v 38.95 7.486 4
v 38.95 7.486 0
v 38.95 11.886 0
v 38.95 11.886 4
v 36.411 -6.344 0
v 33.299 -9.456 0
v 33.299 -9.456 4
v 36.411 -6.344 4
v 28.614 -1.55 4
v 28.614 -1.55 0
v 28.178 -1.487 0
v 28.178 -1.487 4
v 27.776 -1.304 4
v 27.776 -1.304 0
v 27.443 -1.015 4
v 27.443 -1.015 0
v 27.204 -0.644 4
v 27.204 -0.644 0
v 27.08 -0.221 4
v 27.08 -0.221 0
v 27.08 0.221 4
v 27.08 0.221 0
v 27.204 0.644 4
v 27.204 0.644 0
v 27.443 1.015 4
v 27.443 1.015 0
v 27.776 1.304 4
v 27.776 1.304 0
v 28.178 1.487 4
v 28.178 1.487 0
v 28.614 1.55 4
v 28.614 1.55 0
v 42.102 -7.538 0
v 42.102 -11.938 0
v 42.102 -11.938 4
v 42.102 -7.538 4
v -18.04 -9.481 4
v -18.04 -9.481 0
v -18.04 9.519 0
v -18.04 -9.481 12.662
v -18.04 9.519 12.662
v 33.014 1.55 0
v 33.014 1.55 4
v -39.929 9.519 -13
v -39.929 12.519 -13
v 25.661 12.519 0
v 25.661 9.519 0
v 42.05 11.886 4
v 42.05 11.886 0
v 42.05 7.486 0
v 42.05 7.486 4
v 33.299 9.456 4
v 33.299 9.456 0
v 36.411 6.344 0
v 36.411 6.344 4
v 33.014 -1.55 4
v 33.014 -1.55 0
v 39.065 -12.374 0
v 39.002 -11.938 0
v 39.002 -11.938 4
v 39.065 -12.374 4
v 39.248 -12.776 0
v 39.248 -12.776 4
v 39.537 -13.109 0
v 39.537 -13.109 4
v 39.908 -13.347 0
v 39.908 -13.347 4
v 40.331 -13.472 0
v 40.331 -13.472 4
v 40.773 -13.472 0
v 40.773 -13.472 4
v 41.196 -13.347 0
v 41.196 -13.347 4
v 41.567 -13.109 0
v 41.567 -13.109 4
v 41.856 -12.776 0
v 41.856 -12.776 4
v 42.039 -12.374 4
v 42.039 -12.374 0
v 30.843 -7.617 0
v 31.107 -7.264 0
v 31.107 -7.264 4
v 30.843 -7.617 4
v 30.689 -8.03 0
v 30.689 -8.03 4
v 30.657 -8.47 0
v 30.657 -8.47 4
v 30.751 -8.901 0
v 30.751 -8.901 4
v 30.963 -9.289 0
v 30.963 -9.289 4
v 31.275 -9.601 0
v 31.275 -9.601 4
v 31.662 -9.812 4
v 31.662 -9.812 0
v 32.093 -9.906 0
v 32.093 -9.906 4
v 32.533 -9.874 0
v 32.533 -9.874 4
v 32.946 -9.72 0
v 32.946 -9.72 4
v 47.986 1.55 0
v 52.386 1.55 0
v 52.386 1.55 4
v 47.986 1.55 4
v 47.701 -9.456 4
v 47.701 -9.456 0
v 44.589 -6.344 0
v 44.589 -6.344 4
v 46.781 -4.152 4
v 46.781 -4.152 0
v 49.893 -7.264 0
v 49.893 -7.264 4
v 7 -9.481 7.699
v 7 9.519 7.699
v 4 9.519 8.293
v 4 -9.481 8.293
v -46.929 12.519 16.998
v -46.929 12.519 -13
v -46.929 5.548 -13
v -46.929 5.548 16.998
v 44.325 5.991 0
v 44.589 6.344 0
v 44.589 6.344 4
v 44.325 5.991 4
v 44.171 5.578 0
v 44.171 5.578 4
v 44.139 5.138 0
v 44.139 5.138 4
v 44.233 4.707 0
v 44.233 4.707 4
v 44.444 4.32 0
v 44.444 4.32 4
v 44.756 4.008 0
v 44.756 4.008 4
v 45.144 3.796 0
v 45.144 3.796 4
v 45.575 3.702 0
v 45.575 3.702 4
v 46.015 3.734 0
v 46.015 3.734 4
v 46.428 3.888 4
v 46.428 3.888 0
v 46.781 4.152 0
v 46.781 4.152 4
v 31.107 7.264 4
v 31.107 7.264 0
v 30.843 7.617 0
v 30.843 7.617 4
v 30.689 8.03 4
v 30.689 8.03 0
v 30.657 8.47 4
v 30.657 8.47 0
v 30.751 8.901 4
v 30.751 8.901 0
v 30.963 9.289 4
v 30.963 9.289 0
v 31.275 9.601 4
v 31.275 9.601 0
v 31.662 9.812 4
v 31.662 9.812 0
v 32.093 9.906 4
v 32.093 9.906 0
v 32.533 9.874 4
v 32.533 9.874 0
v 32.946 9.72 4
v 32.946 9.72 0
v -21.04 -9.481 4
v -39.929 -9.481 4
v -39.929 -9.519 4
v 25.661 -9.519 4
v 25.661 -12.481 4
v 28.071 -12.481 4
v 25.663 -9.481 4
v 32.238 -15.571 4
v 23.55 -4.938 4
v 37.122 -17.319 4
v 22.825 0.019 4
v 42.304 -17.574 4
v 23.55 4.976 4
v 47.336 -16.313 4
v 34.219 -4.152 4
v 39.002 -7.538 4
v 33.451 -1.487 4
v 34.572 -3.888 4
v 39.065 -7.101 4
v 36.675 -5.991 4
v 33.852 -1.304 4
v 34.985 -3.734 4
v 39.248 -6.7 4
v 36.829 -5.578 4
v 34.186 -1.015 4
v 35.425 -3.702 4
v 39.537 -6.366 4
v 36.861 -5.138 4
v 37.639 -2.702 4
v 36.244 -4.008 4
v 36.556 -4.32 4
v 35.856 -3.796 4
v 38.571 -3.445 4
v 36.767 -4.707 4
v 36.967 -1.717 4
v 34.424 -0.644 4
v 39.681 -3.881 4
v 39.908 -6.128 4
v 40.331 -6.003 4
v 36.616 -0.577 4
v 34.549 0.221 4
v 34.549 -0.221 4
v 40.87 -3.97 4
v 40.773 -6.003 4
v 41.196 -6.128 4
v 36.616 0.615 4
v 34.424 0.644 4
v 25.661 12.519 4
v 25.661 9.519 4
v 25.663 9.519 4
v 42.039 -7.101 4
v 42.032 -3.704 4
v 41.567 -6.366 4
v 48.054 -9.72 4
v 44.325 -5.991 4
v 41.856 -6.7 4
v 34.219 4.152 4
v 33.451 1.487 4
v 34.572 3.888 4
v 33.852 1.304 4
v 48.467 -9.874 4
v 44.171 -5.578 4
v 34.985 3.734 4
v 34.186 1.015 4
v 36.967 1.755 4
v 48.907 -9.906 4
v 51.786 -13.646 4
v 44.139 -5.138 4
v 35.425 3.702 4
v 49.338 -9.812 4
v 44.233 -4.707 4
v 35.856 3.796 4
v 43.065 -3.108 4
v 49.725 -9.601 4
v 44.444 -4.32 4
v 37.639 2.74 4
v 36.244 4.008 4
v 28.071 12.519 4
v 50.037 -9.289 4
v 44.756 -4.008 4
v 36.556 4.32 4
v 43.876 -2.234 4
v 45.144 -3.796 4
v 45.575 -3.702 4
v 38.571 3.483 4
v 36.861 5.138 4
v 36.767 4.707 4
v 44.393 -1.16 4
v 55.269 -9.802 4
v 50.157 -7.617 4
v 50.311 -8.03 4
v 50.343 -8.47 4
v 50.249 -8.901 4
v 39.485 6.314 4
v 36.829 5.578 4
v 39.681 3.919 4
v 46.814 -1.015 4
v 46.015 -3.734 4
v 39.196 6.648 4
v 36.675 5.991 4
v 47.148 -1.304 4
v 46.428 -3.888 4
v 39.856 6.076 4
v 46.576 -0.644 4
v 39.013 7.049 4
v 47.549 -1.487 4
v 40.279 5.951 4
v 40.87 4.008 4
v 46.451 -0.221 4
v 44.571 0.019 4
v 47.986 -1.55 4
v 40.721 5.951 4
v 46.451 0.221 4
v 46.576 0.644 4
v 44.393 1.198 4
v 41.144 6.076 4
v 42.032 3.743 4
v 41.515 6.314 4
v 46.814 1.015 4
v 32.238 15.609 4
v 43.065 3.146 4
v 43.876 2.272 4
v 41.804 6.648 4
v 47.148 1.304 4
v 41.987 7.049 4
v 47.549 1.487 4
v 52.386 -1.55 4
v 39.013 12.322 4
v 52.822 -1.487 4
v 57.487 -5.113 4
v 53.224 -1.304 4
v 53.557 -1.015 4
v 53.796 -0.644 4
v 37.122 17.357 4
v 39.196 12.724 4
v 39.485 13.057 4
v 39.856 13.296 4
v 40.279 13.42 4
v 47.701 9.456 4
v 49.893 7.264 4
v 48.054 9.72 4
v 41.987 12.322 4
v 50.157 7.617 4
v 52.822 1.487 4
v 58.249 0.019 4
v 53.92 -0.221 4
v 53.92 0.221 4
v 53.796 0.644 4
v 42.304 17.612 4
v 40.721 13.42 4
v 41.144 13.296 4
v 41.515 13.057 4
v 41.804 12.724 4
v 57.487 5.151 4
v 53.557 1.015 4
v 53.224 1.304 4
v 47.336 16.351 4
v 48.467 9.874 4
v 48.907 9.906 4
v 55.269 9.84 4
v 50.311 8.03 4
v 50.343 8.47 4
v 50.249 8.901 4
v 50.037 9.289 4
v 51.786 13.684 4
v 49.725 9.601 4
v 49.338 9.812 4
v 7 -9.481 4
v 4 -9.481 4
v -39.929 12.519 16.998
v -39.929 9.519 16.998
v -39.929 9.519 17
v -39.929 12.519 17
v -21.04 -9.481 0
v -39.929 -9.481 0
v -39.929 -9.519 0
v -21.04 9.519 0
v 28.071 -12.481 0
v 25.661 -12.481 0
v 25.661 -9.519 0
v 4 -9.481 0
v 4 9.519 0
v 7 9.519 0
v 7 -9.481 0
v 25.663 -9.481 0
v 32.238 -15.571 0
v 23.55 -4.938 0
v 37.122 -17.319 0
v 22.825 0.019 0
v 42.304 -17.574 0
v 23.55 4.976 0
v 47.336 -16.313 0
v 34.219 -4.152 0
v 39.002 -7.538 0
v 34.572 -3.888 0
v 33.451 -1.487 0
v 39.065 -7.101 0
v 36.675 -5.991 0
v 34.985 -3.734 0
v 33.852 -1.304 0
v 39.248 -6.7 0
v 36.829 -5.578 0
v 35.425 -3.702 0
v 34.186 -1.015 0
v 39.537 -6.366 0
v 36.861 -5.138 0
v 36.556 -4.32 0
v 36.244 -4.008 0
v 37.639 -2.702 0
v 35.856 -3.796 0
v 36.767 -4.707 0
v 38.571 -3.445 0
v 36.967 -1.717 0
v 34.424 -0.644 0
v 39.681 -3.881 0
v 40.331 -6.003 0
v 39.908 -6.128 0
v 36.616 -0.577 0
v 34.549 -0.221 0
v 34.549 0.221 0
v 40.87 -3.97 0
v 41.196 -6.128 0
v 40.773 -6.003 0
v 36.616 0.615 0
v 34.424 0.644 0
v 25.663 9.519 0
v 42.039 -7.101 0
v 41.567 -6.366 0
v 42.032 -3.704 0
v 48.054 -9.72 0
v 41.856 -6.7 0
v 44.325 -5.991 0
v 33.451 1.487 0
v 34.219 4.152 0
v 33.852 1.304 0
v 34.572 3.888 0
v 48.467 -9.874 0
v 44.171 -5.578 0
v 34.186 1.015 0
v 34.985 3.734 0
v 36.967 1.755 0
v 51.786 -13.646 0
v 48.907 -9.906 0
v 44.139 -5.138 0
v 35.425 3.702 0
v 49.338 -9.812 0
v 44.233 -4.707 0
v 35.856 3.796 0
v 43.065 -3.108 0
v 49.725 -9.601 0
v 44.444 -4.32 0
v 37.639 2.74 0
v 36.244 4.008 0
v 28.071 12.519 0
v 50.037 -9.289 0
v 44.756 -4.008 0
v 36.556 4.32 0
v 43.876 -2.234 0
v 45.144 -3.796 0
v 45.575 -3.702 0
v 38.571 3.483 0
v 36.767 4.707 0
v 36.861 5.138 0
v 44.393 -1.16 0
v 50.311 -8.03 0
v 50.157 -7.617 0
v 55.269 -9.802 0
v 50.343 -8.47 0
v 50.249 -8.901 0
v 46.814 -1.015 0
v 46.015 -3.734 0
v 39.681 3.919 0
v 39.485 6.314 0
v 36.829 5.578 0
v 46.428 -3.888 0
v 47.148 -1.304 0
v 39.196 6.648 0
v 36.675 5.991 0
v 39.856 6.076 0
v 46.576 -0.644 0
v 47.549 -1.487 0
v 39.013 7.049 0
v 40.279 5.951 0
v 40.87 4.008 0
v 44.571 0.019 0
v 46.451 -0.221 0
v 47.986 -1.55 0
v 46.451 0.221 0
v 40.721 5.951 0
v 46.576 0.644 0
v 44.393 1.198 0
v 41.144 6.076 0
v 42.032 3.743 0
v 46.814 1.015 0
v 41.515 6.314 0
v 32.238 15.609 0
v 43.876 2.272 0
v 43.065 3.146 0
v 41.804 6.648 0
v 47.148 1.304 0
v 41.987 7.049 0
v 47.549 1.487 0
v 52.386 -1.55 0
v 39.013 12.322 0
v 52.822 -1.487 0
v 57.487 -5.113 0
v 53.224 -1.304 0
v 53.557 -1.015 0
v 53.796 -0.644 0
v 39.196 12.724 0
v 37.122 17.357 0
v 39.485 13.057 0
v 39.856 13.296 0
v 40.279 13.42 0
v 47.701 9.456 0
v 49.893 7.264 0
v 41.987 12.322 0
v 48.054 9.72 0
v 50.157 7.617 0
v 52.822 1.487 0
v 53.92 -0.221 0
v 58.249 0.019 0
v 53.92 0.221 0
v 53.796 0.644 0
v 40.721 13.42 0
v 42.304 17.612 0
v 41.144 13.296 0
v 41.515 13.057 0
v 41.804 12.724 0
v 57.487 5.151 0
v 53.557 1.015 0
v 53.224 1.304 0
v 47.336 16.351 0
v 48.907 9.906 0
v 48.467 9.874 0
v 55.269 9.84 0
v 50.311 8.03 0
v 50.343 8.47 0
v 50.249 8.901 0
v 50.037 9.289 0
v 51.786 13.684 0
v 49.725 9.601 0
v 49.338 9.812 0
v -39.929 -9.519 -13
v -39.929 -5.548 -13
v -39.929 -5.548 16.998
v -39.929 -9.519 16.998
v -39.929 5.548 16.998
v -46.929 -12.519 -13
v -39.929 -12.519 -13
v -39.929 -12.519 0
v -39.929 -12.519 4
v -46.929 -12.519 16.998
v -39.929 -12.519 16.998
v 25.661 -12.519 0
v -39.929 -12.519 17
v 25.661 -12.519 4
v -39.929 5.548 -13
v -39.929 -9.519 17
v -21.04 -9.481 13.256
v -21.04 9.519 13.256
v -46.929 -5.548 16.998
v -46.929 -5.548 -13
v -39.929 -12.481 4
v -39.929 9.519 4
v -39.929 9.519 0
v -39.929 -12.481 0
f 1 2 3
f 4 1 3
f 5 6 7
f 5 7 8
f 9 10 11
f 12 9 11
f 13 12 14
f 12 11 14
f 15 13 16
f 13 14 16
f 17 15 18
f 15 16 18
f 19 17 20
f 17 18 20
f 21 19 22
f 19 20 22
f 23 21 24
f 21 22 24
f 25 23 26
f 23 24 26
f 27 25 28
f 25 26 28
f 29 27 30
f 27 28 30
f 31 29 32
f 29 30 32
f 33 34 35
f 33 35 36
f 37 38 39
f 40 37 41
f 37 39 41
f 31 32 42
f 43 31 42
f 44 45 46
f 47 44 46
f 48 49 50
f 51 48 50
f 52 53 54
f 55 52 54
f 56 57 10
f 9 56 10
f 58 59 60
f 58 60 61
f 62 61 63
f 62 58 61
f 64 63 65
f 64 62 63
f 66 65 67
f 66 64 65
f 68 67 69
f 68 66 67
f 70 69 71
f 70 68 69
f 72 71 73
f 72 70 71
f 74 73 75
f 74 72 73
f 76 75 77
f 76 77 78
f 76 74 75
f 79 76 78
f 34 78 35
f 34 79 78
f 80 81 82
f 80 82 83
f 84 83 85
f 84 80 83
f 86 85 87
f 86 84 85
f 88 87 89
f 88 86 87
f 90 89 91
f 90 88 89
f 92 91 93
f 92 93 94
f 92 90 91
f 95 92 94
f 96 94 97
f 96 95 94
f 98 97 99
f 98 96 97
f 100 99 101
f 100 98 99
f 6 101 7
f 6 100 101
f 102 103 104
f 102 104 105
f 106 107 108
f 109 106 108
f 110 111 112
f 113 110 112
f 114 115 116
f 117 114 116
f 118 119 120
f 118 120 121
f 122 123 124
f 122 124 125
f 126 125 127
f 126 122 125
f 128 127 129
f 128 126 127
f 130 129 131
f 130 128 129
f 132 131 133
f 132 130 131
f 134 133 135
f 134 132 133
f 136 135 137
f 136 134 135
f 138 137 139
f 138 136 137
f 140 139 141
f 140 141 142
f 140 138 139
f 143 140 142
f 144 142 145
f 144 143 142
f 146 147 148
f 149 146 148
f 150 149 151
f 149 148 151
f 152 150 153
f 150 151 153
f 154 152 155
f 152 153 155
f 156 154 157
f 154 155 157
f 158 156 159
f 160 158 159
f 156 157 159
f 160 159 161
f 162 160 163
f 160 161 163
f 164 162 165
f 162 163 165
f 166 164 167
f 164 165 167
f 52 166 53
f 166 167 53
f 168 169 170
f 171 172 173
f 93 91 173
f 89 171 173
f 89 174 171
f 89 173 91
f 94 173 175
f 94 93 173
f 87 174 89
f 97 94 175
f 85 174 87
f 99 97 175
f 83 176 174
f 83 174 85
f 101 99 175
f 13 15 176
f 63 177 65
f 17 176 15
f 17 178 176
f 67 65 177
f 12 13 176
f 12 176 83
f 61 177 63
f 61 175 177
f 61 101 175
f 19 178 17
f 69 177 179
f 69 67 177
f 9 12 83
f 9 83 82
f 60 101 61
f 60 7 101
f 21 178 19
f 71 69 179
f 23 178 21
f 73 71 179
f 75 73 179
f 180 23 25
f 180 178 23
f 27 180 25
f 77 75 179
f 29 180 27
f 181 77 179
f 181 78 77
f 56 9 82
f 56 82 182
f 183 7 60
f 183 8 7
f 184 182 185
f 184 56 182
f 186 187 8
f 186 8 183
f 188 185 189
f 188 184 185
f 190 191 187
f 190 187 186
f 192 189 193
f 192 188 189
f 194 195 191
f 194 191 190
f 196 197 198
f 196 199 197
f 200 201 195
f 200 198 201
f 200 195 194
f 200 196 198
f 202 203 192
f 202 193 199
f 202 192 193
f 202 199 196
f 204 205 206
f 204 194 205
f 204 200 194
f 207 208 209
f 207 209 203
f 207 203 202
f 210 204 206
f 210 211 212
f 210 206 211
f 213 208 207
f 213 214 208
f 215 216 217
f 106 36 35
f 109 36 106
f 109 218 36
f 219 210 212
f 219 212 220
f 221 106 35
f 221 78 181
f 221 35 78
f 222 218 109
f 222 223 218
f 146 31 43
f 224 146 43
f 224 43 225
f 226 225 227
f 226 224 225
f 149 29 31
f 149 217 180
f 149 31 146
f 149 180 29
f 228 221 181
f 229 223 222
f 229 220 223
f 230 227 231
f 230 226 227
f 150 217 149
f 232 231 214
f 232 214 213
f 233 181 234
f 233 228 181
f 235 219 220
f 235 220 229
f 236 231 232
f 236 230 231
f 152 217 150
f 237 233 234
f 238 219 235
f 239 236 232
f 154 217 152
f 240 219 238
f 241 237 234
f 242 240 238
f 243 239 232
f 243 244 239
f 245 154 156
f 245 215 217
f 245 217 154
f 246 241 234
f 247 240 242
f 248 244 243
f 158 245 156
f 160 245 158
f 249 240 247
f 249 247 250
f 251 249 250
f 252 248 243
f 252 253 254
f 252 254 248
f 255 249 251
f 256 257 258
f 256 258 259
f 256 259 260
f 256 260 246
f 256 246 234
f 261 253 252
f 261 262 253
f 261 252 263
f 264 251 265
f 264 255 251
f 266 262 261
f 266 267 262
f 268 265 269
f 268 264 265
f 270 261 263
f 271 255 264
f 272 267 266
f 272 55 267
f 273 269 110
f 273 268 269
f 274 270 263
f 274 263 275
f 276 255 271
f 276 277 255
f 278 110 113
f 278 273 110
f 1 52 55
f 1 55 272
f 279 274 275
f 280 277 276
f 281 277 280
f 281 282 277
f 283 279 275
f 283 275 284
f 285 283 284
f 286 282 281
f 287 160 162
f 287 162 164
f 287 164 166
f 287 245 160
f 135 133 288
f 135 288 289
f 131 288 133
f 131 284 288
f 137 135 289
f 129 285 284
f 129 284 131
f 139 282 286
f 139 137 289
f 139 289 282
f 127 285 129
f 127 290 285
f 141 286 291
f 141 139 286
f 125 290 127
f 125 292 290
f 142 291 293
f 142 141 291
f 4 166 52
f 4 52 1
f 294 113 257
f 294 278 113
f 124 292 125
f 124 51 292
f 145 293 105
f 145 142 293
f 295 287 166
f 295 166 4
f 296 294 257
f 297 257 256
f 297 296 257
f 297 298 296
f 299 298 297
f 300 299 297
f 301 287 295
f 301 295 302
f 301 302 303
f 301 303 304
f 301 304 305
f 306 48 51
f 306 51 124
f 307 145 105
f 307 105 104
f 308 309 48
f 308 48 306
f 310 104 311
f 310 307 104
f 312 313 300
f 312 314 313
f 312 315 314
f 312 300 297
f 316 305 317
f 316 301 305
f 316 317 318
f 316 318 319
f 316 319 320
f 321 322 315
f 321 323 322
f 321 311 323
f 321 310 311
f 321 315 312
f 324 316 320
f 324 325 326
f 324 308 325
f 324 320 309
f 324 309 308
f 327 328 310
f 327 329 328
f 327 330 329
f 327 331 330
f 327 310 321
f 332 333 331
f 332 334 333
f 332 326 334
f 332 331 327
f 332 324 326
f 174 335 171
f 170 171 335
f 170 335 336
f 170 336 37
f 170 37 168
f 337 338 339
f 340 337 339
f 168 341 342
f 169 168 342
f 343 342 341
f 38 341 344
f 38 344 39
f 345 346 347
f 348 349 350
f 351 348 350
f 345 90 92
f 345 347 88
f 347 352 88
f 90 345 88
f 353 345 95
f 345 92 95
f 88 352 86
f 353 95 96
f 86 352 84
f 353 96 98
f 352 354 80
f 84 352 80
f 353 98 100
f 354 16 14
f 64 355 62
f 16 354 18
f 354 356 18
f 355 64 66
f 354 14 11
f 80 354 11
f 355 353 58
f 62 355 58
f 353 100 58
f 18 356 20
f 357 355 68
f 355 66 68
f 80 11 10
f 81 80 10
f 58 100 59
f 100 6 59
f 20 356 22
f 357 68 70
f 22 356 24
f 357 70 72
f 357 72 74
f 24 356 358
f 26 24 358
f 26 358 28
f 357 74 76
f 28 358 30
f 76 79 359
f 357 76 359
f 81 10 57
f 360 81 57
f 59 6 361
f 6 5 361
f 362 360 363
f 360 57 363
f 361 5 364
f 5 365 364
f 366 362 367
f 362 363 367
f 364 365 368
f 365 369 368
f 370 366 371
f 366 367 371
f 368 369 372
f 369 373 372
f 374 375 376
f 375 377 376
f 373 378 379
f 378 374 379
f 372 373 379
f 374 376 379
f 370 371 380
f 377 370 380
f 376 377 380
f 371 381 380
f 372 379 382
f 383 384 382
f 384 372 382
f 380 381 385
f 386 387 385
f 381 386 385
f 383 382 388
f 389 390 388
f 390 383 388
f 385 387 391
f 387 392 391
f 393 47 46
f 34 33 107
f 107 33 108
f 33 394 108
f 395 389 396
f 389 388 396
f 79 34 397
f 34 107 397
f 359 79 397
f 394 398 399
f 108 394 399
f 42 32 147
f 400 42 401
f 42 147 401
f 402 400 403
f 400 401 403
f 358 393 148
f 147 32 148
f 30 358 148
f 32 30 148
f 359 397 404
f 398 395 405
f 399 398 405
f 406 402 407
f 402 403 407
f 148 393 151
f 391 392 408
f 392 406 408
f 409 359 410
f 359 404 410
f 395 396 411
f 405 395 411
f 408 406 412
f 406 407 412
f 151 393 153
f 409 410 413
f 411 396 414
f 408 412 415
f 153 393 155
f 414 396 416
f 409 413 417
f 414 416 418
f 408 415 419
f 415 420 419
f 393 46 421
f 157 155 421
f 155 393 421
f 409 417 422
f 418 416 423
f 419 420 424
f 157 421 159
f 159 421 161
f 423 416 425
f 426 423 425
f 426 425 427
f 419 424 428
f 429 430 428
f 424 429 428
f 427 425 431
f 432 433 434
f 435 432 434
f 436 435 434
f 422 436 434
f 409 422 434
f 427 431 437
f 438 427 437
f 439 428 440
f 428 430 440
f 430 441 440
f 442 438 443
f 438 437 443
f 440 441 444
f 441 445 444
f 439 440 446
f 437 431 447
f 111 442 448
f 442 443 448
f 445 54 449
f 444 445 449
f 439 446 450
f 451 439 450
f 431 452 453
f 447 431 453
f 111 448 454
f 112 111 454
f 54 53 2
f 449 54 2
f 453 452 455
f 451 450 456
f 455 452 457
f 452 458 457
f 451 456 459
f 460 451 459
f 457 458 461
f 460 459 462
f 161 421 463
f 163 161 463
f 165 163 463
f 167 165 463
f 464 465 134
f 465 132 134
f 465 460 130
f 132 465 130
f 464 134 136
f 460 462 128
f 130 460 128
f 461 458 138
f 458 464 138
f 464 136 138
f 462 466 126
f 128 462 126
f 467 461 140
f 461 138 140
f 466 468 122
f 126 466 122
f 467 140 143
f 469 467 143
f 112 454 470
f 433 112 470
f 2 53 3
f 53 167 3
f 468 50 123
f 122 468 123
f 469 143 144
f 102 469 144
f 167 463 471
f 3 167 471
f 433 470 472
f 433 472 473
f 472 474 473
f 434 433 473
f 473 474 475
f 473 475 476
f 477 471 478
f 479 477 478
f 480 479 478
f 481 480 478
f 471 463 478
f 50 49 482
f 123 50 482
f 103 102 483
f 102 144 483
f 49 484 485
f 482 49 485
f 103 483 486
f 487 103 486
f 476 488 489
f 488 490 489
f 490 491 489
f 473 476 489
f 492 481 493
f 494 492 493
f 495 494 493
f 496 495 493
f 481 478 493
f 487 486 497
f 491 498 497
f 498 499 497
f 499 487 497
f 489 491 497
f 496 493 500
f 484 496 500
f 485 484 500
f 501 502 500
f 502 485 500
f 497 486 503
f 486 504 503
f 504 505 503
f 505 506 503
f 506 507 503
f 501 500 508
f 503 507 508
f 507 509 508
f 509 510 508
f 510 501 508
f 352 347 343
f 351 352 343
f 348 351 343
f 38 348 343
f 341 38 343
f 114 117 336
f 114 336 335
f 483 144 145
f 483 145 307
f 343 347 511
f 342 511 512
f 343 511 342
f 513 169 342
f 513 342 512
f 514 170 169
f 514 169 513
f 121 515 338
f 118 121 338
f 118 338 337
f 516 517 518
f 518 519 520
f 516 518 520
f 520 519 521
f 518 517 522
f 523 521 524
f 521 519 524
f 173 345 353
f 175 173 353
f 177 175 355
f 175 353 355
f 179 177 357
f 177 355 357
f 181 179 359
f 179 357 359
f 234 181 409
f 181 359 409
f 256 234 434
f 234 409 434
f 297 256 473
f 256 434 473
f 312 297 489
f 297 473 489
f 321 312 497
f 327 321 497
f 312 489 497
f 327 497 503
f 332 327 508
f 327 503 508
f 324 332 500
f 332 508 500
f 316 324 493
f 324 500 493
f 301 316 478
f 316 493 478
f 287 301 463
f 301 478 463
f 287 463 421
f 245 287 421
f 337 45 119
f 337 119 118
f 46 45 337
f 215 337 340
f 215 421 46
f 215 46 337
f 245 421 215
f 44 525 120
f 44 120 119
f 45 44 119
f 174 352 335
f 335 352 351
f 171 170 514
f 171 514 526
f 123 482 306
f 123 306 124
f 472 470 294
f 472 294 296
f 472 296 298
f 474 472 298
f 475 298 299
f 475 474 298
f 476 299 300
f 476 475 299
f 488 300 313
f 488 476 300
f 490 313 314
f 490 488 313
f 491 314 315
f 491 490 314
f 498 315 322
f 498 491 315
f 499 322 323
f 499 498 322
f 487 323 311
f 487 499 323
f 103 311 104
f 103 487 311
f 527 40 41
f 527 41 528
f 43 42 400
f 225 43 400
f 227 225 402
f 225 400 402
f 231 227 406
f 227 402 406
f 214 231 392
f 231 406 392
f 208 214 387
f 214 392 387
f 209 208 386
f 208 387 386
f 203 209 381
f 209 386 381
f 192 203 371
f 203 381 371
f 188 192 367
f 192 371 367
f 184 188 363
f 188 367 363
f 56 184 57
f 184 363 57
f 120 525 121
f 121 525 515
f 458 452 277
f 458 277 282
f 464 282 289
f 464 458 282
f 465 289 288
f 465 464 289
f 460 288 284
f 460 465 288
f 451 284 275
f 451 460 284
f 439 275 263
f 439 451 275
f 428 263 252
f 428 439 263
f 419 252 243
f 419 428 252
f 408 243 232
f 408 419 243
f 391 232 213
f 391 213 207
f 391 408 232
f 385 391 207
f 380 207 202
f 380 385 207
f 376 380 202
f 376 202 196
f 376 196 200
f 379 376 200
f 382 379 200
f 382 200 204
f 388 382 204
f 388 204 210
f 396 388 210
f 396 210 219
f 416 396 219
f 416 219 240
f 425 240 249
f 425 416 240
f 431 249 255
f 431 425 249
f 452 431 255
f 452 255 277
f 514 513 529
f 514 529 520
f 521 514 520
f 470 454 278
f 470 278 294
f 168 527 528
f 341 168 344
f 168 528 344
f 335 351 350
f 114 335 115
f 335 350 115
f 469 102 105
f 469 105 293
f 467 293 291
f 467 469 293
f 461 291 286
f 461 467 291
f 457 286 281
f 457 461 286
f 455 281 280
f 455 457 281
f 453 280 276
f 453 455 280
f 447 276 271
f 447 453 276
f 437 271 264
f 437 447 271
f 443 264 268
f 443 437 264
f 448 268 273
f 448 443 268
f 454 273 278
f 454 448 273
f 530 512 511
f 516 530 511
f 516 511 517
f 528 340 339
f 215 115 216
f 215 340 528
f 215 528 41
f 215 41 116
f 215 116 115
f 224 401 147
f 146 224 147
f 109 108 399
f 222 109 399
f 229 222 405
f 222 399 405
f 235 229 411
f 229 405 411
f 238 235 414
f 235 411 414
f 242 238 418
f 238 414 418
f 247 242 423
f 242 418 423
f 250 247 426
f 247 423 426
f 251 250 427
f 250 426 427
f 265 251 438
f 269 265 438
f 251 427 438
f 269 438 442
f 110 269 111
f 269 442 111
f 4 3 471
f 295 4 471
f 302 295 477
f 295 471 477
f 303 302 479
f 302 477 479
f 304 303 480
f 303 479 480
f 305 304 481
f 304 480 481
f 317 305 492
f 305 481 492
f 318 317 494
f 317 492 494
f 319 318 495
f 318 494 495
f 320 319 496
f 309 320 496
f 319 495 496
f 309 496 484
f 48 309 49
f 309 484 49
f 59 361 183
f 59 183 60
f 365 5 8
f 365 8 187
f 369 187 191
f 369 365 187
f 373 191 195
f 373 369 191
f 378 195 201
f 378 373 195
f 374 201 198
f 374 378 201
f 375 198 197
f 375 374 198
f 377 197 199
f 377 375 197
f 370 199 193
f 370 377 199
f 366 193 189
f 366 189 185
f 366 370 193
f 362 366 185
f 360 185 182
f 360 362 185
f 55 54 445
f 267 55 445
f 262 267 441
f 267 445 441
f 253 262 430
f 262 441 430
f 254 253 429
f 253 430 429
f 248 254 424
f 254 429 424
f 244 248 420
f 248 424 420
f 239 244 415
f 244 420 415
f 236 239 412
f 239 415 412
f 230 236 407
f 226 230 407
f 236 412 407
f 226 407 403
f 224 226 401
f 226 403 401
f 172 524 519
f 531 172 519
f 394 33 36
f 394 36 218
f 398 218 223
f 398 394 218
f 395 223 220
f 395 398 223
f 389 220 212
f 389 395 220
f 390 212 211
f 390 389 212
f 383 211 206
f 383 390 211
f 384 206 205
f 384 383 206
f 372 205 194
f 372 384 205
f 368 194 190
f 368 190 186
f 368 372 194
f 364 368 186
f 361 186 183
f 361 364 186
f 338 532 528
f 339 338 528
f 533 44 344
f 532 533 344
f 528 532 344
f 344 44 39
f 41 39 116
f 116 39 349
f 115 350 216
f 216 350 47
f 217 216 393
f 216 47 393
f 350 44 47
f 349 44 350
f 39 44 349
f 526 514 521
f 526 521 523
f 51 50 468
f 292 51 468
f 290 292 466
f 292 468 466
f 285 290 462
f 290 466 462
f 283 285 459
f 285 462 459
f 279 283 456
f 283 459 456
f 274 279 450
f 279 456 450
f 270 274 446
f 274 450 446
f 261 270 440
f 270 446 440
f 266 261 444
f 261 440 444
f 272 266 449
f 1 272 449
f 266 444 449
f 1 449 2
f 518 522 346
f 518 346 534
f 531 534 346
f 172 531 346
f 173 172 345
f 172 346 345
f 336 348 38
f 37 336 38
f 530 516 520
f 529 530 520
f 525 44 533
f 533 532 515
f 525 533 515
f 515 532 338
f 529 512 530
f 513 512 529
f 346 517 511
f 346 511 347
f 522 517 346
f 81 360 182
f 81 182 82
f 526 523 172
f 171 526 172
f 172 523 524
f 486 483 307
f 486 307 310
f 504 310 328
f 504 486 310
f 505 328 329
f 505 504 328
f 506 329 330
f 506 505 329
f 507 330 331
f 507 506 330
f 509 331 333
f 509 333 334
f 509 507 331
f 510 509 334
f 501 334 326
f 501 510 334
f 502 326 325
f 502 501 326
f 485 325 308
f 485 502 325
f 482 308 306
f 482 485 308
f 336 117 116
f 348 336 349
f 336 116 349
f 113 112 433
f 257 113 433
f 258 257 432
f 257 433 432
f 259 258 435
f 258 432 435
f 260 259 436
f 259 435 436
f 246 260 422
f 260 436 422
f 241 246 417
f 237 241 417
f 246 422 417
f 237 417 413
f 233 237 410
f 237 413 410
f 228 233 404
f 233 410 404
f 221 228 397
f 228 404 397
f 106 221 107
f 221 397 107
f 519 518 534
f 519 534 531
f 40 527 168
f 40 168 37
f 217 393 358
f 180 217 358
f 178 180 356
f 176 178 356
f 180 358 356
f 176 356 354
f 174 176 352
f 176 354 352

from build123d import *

# Parameters (mm, degrees)
SKETCH_1_R      = 4
EXTRUDE_3_DEPTH = 4
EXTRUDE_5_DEPTH = 3
EXTRUDE_6_DEPTH = 3
SKETCH_7_W      = 29.9977514
SKETCH_7_H      = 6.971398352
EXTRUDE_7_DEPTH = 7
EXTRUDE_8_DEPTH = 19
EXTRUDE_9_DEPTH = 19


with BuildPart() as part:
    # 草图1 → 凸台-拉伸3 (new body)
    with BuildSketch(Plane.XY):
        with BuildLine():
            Line((-39.928997061, 12.519020092), (-39.928997061, 9.519020095))
            Line((-39.928997061, 9.519020095), (25.662951423, 9.519020095))
            ThreePointArc((25.662951423, 9.519020095), (22.825216093, 0.019020096), (25.662951419, -9.480979905))
            Line((25.662951419, -9.480979905), (-39.928997061, -9.480979905))
            Line((-39.928997061, -9.480979905), (-39.928997061, -12.480979908))
            Line((-39.928997061, -12.480979908), (28.071002939, -12.480979908))
            ThreePointArc((28.071002939, -12.480979908), (58.248672468, 0.019020092), (28.071002939, 12.519020092))
            Line((28.071002939, 12.519020092), (-39.928997061, 12.519020092))
        make_face()
        with Locations((40.571002939, 0.019020092)):
            Circle(SKETCH_1_R, mode=Mode.SUBTRACT)
        with BuildLine():
            Line((28.614427542, 1.55), (33.014427542, 1.55))
            ThreePointArc((33.014427542, 1.55), (34.564427542, 0), (33.014427542, -1.55))
            Line((33.014427542, -1.55), (28.614427542, -1.55))
            ThreePointArc((28.614427542, -1.55), (27.064427542, 0), (28.614427542, 1.55))
        make_face(mode=Mode.SUBTRACT)
        with BuildLine():
            Line((52.385572458, 1.55), (47.985572458, 1.55))
            ThreePointArc((47.985572458, 1.55), (46.435572458, 0), (47.985572458, -1.55))
            Line((47.985572458, -1.55), (52.385572458, -1.55))
            ThreePointArc((52.385572458, -1.55), (53.935572458, 0), (52.385572458, 1.55))
        make_face(mode=Mode.SUBTRACT)
        with BuildLine():
            Line((42.101982847, -11.937555304), (42.101982847, -7.537555304))
            ThreePointArc((42.101982847, -7.537555304), (40.551982847, -5.987555304), (39.001982847, -7.537555304))
            Line((39.001982847, -7.537555304), (39.001982847, -11.937555304))
            ThreePointArc((39.001982847, -11.937555304), (40.551982847, -13.487555304), (42.101982847, -11.937555304))
        make_face(mode=Mode.SUBTRACT)
        with BuildLine():
            Line((33.29940699, 9.45574859), (36.410676827, 6.344478753))
            ThreePointArc((36.410676827, 6.344478753), (36.410676827, 4.152447732), (34.218645805, 4.152447732))
            Line((34.218645805, 4.152447732), (31.107375968, 7.263717569))
            ThreePointArc((31.107375968, 7.263717569), (31.107375968, 9.45574859), (33.29940699, 9.45574859))
        make_face(mode=Mode.SUBTRACT)
        with BuildLine():
            Line((42.05, 11.885572458), (42.05, 7.485572458))
            ThreePointArc((42.05, 7.485572458), (40.5, 5.935572458), (38.95, 7.485572458))
            Line((38.95, 7.485572458), (38.95, 11.885572458))
            ThreePointArc((38.95, 11.885572458), (40.5, 13.435572458), (42.05, 11.885572458))
        make_face(mode=Mode.SUBTRACT)
        with BuildLine():
            Line((47.70059301, 9.45574859), (44.589323173, 6.344478753))
            ThreePointArc((44.589323173, 6.344478753), (44.589323173, 4.152447732), (46.781354195, 4.152447732))
            Line((46.781354195, 4.152447732), (49.892624032, 7.263717569))
            ThreePointArc((49.892624032, 7.263717569), (49.892624032, 9.45574859), (47.70059301, 9.45574859))
        make_face(mode=Mode.SUBTRACT)
        with BuildLine():
            Line((33.29940699, -9.45574859), (36.410676827, -6.344478753))
            ThreePointArc((36.410676827, -6.344478753), (36.410676827, -4.152447732), (34.218645805, -4.152447732))
            Line((34.218645805, -4.152447732), (31.107375968, -7.263717569))
            ThreePointArc((31.107375968, -7.263717569), (31.107375968, -9.45574859), (33.29940699, -9.45574859))
        make_face(mode=Mode.SUBTRACT)
        with BuildLine():
            Line((47.70059301, -9.45574859), (44.589323173, -6.344478753))
            ThreePointArc((44.589323173, -6.344478753), (44.589323173, -4.152447732), (46.781354195, -4.152447732))
            Line((46.781354195, -4.152447732), (49.892624032, -7.263717569))
            ThreePointArc((49.892624032, -7.263717569), (49.892624032, -9.45574859), (47.70059301, -9.45574859))
        make_face(mode=Mode.SUBTRACT)
    extrude(amount=EXTRUDE_3_DEPTH)

    # 草图2 → 凸台-拉伸5 (add)
    with BuildSketch(Plane(origin=(0, 12.519020092, 0), x_dir=(1, 0, 0), z_dir=(0, 1, 0))):
        Polygon((-39.928997061, 0), (-39.928997061, 13), (25.661002939, 0), align=None)
    extrude_5 = extrude(amount=-EXTRUDE_5_DEPTH)

    # 镜向1: 凸台-拉伸5 across plane
    add(extrude_5.mirror(Plane.ZX))

    # 草图5 → 凸台-拉伸6 (add)
    with BuildSketch(Plane(origin=(0, 12.519020092, 0), x_dir=(1, 0, 0), z_dir=(0, 1, 0))):
        Polygon((-39.928997061, -4), (-39.928997061, -17), (25.661002939, -4), align=None)
    extrude_6 = extrude(amount=-EXTRUDE_6_DEPTH)

    # 镜向2: 凸台-拉伸6 across plane
    add(extrude_6.mirror(Plane.ZX))

    # 草图7 → 凸台-拉伸7 (add)
    with BuildSketch(Plane.ZY.offset(39.928997061)):
        with Locations((1.9988757, 9.033320916)):
            Rectangle(SKETCH_7_W, SKETCH_7_H)
    extrude_7 = extrude(amount=EXTRUDE_7_DEPTH)

    # 镜向3: 凸台-拉伸7 across plane
    add(extrude_7.mirror(Plane.ZX))

    # 草图8 → 凸台-拉伸8 (add)
    with BuildSketch(Plane.XZ.offset(-9.519020095)):
        Polygon((-21.039670639, 0), (-18.039670639, 0), (-18.039670639, 12.661514812), (-21.039670639, 13.256117648), align=None)
    extrude(amount=EXTRUDE_8_DEPTH)

    # 草图9 → 凸台-拉伸9 (add)
    with BuildSketch(Plane.XZ.offset(-9.519020095)):
        Polygon((4, 0), (7, 0), (7, 7.698628422), (4, 8.293231258), align=None)
    extrude(amount=EXTRUDE_9_DEPTH)


solid = part.part
